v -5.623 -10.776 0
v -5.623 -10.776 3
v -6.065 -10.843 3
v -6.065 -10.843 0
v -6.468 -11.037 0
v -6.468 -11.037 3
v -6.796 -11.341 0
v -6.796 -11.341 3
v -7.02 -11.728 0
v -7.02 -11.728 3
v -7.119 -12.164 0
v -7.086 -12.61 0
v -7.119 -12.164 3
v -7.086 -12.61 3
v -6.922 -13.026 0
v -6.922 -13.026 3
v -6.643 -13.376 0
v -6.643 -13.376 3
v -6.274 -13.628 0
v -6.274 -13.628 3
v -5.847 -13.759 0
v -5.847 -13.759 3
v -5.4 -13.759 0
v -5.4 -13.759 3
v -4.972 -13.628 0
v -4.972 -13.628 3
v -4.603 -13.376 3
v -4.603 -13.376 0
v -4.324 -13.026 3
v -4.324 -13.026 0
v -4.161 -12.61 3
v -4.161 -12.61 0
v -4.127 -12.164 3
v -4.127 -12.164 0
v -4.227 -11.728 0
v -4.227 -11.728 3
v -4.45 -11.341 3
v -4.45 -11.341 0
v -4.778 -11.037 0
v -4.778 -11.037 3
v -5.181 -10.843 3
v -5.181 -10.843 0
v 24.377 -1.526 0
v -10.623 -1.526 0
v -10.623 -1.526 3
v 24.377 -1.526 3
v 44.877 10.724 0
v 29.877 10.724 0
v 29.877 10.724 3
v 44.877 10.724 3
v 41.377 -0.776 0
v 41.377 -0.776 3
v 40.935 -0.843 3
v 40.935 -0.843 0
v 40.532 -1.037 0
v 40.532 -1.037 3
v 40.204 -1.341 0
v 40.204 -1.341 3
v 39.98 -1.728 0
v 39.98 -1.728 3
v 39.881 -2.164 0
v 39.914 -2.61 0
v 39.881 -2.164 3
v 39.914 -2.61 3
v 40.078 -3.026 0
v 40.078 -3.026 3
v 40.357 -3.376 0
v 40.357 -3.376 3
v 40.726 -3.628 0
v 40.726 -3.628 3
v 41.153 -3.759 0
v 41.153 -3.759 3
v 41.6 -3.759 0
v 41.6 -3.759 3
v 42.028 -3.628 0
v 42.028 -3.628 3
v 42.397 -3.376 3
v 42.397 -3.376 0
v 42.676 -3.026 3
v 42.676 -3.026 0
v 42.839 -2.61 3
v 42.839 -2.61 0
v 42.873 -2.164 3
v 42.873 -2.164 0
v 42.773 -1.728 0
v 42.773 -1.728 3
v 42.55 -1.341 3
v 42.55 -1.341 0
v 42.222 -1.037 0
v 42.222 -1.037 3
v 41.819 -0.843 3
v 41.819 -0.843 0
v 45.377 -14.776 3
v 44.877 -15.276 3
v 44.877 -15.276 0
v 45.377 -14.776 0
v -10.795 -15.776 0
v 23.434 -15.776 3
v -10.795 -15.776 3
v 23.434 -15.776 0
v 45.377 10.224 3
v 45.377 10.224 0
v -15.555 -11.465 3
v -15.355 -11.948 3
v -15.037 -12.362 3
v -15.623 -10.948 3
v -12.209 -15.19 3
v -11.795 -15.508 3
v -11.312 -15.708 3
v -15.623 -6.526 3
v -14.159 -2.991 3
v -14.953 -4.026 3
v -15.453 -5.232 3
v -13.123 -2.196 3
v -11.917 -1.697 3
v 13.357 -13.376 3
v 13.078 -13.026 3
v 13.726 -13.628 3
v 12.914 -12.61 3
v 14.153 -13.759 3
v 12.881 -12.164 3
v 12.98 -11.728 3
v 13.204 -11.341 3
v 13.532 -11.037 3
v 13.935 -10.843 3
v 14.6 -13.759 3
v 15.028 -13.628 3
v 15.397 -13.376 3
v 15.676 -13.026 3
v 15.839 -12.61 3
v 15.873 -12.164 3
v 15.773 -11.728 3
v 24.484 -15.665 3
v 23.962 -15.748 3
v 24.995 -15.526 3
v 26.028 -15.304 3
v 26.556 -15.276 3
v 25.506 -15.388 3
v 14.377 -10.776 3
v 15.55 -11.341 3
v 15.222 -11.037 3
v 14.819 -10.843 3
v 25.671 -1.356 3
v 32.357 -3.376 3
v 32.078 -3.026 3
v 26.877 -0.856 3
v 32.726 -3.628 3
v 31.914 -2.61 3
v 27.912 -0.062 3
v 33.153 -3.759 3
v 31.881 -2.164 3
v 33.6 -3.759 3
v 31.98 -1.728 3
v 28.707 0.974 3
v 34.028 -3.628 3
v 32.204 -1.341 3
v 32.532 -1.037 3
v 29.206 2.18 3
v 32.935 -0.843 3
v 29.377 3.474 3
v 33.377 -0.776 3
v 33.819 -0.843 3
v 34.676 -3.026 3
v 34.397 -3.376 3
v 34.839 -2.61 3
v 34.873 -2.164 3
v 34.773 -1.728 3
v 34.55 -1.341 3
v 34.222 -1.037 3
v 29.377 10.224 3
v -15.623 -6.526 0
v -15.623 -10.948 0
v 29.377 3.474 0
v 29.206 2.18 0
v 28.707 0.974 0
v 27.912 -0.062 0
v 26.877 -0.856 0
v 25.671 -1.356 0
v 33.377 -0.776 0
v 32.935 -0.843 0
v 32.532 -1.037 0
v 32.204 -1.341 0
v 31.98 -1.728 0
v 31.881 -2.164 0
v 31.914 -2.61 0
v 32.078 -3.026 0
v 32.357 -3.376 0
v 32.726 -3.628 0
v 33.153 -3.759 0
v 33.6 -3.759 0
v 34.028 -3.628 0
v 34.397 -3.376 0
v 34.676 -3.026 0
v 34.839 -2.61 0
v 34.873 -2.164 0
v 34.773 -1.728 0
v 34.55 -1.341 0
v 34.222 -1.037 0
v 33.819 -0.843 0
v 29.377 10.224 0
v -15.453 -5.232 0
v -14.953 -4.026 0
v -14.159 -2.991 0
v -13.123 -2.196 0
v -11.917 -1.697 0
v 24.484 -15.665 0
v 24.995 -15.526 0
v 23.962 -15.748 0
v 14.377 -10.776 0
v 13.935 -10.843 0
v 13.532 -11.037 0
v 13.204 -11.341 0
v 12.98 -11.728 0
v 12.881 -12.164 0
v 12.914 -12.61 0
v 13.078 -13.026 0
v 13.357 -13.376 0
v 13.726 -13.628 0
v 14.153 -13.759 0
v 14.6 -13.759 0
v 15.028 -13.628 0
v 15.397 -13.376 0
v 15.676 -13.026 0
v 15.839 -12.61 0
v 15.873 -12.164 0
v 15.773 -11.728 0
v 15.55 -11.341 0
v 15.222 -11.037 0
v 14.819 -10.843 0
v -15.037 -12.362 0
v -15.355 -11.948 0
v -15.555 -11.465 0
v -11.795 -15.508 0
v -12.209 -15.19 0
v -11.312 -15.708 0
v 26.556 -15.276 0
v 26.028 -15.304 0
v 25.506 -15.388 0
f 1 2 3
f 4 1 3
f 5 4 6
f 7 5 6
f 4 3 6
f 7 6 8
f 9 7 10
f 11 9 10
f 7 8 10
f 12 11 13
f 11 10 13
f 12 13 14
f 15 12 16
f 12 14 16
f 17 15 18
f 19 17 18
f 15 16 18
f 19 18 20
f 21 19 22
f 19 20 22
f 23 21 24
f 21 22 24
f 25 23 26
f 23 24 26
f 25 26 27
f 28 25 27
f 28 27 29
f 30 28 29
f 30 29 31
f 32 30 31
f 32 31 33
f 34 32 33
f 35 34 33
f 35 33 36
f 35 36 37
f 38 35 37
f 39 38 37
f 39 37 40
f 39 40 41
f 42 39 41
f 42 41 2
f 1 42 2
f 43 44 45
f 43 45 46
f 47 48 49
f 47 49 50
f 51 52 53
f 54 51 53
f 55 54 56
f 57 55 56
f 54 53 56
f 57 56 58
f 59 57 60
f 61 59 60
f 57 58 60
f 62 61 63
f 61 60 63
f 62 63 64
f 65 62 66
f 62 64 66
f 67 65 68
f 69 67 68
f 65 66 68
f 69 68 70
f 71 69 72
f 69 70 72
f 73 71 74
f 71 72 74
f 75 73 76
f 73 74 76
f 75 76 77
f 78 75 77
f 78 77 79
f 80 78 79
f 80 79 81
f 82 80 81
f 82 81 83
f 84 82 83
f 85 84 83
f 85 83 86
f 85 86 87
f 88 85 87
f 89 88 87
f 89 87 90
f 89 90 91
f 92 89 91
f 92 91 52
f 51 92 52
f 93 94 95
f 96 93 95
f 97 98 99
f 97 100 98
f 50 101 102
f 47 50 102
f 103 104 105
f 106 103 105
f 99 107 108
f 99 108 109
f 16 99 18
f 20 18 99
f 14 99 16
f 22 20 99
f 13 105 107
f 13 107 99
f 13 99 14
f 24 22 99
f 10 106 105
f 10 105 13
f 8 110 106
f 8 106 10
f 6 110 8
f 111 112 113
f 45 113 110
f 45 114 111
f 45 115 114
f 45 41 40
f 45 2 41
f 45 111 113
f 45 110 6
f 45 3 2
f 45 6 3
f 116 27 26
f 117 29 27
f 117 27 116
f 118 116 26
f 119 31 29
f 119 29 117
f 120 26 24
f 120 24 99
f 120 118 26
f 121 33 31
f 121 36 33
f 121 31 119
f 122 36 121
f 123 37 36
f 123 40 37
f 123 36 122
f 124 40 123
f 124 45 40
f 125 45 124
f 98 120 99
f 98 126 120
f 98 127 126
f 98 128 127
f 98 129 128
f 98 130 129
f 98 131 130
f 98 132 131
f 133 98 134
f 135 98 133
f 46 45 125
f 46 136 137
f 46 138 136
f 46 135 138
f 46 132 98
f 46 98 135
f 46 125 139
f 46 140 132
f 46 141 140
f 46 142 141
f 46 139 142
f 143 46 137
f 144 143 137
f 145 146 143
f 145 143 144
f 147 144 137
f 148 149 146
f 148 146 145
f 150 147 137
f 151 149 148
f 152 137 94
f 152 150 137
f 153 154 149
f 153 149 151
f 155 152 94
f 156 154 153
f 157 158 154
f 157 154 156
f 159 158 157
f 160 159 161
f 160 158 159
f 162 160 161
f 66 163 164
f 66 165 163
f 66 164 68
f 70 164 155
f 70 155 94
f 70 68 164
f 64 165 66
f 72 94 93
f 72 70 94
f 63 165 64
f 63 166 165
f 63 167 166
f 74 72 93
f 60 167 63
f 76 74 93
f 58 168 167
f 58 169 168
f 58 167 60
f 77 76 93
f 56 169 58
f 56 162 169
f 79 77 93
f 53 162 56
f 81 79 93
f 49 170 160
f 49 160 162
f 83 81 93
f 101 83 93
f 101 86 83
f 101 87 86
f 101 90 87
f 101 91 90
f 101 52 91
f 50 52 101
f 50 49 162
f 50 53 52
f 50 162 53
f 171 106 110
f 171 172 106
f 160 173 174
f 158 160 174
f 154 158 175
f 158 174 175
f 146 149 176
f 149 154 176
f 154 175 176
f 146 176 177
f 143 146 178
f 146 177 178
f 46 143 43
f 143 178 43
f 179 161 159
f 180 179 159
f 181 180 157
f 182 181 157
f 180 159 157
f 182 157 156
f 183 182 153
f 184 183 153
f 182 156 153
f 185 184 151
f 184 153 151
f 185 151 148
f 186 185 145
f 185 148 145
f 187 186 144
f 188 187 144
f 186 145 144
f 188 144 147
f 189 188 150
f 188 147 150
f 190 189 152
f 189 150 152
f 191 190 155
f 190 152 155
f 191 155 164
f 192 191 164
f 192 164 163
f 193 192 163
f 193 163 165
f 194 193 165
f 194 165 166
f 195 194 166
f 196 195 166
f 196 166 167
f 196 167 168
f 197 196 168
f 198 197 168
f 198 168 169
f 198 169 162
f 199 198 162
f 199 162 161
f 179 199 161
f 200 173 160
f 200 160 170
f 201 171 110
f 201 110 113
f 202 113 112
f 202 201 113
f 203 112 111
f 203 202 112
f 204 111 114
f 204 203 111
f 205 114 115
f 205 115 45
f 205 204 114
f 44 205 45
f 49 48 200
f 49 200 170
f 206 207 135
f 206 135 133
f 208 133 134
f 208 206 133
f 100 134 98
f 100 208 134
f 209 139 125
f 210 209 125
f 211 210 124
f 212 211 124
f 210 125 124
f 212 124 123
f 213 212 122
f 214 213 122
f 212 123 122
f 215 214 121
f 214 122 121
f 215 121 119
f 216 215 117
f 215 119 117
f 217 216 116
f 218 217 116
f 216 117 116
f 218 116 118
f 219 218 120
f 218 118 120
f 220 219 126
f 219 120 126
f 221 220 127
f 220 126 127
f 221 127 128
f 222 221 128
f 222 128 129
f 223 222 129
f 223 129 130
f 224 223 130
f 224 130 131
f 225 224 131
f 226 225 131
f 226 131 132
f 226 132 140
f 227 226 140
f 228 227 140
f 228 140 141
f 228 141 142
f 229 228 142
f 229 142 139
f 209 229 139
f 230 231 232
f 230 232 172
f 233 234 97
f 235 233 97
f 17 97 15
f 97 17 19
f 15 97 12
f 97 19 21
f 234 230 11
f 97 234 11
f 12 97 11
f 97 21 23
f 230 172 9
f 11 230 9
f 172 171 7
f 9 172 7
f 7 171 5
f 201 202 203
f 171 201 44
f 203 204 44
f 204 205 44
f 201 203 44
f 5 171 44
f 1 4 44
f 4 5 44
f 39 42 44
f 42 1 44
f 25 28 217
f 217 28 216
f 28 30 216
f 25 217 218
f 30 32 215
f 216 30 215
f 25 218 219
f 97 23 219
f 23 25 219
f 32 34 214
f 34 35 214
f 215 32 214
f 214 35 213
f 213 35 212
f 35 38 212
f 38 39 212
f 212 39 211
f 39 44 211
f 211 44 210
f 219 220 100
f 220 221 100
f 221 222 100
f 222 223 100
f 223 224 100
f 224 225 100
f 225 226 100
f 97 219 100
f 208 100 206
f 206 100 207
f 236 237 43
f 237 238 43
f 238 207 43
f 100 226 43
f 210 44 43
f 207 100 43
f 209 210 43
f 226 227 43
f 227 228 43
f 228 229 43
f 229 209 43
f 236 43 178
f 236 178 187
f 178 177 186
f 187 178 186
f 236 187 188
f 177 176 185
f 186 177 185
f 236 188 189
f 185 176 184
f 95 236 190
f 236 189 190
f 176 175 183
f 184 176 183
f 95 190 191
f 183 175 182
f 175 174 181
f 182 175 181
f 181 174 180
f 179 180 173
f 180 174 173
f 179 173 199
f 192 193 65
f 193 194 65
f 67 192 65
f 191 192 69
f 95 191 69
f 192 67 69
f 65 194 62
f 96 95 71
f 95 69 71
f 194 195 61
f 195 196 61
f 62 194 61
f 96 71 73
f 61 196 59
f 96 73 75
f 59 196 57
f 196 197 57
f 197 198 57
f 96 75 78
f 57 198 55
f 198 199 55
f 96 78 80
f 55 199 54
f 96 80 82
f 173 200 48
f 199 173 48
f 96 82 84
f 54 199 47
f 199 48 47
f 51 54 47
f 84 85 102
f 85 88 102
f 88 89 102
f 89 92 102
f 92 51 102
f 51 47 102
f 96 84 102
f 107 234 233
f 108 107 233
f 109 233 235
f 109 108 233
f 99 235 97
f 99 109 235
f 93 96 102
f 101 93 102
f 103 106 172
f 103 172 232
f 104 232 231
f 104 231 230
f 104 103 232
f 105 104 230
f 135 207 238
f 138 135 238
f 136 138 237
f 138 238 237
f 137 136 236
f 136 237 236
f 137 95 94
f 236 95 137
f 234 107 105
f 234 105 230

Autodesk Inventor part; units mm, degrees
ref_plane "YZ Plane" through (0, 0, 0) normal (1, 0, 0) x (0, 1, 0)
ref_plane "XZ Plane" through (0, 0, 0) normal (0, 1, 0) x (-1, 0, 0)
ref_plane "XY Plane" through (0, 0, 0) normal (0, 0, 1) x (1, 0, 0)
sketch "Szkic1" plane through (0, 0, 0) normal (0, 0, 1) x (1, 0, 0)
  line L0 (-15.6232, -1.5262) -> (24.3768, -1.5262)
  line L1 (24.3768, -1.5262) -> (24.3768, -15.7762)
  line L2 (24.3768, -15.7762) -> (-15.6232, -15.7762)
  line L3 (-15.6232, -15.7762) -> (-15.6232, -1.5262)
  line L4 (24.3768, -1.5262) -> (29.3768, -1.5262)
  line L5 (29.3768, -1.5262) -> (29.3768, 10.7238)
  line L6 (29.3768, 10.7238) -> (45.3768, 10.7238)
  line L7 (45.3768, -15.2762) -> (45.3768, 10.7238)
  line L8 (45.3768, -15.2762) -> (24.3768, -15.2762)
  point P0 (0, 0)
  point P1 (-5.6232, -12.2762)
  point P2 (14.3768, -12.2762)
  point P3 (33.3768, -2.2762)
  point P4 (41.3768, -2.2762)
  dimension "d0" = 40
  dimension "d1" = 14.25
  dimension "d2" = 10
  dimension "d3" = 10
  dimension "d4" = 3.5
  dimension "d5" = 3.5
  dimension "d6" = 5
  dimension "d7" = 16
  dimension "d18" = 26
  dimension "d19" = 0.5
  dimension "d20" = 13
  dimension "d21" = 13
  dimension "d22" = 4
  dimension "d23" = 4
extrude "Wyciągnięcie proste1" add sketch "Szkic1" along normal blind 3
hole "Otwór1" at (-5.6232, -12.2762, 0) at (14.3768, -12.2762, 0) at (33.3768, -2.2762, 0) at (41.3768, -2.2762, 0) direction (0, 0, 1) diameter 3 end through all
chamfer "Faza1" distance 4 angle 45 1 edges at (-15.6232, -15.7762, 1.5)
fillet "Zaokrąglenie1" radius 2 2 edges at (-15.6232, -11.7762, 1.5) (-11.6232, -15.7762, 1.5)
fillet "Zaokrąglenie2" radius 5 4 edges at (-15.6232, -1.5262, 1.5) (29.3768, -1.5262, 1.5) (24.3768, -15.2762, 1.5) (24.3768, -15.7762, 1.5)
chamfer "Faza2" distance 0.5 angle 45 3 edges at (29.3768, 10.7238, 1.5) (45.3768, 10.7238, 1.5) (45.3768, -15.2762, 1.5)
equation "\"d3\" = d2"
equation "\"d20\" = 0.5 * d18"
equation "\"d21\" = 0.5 * d18"
properties part number "LC_ALU_3mm_Y_Axis_IGUS_Cable_Chain_Mount"
